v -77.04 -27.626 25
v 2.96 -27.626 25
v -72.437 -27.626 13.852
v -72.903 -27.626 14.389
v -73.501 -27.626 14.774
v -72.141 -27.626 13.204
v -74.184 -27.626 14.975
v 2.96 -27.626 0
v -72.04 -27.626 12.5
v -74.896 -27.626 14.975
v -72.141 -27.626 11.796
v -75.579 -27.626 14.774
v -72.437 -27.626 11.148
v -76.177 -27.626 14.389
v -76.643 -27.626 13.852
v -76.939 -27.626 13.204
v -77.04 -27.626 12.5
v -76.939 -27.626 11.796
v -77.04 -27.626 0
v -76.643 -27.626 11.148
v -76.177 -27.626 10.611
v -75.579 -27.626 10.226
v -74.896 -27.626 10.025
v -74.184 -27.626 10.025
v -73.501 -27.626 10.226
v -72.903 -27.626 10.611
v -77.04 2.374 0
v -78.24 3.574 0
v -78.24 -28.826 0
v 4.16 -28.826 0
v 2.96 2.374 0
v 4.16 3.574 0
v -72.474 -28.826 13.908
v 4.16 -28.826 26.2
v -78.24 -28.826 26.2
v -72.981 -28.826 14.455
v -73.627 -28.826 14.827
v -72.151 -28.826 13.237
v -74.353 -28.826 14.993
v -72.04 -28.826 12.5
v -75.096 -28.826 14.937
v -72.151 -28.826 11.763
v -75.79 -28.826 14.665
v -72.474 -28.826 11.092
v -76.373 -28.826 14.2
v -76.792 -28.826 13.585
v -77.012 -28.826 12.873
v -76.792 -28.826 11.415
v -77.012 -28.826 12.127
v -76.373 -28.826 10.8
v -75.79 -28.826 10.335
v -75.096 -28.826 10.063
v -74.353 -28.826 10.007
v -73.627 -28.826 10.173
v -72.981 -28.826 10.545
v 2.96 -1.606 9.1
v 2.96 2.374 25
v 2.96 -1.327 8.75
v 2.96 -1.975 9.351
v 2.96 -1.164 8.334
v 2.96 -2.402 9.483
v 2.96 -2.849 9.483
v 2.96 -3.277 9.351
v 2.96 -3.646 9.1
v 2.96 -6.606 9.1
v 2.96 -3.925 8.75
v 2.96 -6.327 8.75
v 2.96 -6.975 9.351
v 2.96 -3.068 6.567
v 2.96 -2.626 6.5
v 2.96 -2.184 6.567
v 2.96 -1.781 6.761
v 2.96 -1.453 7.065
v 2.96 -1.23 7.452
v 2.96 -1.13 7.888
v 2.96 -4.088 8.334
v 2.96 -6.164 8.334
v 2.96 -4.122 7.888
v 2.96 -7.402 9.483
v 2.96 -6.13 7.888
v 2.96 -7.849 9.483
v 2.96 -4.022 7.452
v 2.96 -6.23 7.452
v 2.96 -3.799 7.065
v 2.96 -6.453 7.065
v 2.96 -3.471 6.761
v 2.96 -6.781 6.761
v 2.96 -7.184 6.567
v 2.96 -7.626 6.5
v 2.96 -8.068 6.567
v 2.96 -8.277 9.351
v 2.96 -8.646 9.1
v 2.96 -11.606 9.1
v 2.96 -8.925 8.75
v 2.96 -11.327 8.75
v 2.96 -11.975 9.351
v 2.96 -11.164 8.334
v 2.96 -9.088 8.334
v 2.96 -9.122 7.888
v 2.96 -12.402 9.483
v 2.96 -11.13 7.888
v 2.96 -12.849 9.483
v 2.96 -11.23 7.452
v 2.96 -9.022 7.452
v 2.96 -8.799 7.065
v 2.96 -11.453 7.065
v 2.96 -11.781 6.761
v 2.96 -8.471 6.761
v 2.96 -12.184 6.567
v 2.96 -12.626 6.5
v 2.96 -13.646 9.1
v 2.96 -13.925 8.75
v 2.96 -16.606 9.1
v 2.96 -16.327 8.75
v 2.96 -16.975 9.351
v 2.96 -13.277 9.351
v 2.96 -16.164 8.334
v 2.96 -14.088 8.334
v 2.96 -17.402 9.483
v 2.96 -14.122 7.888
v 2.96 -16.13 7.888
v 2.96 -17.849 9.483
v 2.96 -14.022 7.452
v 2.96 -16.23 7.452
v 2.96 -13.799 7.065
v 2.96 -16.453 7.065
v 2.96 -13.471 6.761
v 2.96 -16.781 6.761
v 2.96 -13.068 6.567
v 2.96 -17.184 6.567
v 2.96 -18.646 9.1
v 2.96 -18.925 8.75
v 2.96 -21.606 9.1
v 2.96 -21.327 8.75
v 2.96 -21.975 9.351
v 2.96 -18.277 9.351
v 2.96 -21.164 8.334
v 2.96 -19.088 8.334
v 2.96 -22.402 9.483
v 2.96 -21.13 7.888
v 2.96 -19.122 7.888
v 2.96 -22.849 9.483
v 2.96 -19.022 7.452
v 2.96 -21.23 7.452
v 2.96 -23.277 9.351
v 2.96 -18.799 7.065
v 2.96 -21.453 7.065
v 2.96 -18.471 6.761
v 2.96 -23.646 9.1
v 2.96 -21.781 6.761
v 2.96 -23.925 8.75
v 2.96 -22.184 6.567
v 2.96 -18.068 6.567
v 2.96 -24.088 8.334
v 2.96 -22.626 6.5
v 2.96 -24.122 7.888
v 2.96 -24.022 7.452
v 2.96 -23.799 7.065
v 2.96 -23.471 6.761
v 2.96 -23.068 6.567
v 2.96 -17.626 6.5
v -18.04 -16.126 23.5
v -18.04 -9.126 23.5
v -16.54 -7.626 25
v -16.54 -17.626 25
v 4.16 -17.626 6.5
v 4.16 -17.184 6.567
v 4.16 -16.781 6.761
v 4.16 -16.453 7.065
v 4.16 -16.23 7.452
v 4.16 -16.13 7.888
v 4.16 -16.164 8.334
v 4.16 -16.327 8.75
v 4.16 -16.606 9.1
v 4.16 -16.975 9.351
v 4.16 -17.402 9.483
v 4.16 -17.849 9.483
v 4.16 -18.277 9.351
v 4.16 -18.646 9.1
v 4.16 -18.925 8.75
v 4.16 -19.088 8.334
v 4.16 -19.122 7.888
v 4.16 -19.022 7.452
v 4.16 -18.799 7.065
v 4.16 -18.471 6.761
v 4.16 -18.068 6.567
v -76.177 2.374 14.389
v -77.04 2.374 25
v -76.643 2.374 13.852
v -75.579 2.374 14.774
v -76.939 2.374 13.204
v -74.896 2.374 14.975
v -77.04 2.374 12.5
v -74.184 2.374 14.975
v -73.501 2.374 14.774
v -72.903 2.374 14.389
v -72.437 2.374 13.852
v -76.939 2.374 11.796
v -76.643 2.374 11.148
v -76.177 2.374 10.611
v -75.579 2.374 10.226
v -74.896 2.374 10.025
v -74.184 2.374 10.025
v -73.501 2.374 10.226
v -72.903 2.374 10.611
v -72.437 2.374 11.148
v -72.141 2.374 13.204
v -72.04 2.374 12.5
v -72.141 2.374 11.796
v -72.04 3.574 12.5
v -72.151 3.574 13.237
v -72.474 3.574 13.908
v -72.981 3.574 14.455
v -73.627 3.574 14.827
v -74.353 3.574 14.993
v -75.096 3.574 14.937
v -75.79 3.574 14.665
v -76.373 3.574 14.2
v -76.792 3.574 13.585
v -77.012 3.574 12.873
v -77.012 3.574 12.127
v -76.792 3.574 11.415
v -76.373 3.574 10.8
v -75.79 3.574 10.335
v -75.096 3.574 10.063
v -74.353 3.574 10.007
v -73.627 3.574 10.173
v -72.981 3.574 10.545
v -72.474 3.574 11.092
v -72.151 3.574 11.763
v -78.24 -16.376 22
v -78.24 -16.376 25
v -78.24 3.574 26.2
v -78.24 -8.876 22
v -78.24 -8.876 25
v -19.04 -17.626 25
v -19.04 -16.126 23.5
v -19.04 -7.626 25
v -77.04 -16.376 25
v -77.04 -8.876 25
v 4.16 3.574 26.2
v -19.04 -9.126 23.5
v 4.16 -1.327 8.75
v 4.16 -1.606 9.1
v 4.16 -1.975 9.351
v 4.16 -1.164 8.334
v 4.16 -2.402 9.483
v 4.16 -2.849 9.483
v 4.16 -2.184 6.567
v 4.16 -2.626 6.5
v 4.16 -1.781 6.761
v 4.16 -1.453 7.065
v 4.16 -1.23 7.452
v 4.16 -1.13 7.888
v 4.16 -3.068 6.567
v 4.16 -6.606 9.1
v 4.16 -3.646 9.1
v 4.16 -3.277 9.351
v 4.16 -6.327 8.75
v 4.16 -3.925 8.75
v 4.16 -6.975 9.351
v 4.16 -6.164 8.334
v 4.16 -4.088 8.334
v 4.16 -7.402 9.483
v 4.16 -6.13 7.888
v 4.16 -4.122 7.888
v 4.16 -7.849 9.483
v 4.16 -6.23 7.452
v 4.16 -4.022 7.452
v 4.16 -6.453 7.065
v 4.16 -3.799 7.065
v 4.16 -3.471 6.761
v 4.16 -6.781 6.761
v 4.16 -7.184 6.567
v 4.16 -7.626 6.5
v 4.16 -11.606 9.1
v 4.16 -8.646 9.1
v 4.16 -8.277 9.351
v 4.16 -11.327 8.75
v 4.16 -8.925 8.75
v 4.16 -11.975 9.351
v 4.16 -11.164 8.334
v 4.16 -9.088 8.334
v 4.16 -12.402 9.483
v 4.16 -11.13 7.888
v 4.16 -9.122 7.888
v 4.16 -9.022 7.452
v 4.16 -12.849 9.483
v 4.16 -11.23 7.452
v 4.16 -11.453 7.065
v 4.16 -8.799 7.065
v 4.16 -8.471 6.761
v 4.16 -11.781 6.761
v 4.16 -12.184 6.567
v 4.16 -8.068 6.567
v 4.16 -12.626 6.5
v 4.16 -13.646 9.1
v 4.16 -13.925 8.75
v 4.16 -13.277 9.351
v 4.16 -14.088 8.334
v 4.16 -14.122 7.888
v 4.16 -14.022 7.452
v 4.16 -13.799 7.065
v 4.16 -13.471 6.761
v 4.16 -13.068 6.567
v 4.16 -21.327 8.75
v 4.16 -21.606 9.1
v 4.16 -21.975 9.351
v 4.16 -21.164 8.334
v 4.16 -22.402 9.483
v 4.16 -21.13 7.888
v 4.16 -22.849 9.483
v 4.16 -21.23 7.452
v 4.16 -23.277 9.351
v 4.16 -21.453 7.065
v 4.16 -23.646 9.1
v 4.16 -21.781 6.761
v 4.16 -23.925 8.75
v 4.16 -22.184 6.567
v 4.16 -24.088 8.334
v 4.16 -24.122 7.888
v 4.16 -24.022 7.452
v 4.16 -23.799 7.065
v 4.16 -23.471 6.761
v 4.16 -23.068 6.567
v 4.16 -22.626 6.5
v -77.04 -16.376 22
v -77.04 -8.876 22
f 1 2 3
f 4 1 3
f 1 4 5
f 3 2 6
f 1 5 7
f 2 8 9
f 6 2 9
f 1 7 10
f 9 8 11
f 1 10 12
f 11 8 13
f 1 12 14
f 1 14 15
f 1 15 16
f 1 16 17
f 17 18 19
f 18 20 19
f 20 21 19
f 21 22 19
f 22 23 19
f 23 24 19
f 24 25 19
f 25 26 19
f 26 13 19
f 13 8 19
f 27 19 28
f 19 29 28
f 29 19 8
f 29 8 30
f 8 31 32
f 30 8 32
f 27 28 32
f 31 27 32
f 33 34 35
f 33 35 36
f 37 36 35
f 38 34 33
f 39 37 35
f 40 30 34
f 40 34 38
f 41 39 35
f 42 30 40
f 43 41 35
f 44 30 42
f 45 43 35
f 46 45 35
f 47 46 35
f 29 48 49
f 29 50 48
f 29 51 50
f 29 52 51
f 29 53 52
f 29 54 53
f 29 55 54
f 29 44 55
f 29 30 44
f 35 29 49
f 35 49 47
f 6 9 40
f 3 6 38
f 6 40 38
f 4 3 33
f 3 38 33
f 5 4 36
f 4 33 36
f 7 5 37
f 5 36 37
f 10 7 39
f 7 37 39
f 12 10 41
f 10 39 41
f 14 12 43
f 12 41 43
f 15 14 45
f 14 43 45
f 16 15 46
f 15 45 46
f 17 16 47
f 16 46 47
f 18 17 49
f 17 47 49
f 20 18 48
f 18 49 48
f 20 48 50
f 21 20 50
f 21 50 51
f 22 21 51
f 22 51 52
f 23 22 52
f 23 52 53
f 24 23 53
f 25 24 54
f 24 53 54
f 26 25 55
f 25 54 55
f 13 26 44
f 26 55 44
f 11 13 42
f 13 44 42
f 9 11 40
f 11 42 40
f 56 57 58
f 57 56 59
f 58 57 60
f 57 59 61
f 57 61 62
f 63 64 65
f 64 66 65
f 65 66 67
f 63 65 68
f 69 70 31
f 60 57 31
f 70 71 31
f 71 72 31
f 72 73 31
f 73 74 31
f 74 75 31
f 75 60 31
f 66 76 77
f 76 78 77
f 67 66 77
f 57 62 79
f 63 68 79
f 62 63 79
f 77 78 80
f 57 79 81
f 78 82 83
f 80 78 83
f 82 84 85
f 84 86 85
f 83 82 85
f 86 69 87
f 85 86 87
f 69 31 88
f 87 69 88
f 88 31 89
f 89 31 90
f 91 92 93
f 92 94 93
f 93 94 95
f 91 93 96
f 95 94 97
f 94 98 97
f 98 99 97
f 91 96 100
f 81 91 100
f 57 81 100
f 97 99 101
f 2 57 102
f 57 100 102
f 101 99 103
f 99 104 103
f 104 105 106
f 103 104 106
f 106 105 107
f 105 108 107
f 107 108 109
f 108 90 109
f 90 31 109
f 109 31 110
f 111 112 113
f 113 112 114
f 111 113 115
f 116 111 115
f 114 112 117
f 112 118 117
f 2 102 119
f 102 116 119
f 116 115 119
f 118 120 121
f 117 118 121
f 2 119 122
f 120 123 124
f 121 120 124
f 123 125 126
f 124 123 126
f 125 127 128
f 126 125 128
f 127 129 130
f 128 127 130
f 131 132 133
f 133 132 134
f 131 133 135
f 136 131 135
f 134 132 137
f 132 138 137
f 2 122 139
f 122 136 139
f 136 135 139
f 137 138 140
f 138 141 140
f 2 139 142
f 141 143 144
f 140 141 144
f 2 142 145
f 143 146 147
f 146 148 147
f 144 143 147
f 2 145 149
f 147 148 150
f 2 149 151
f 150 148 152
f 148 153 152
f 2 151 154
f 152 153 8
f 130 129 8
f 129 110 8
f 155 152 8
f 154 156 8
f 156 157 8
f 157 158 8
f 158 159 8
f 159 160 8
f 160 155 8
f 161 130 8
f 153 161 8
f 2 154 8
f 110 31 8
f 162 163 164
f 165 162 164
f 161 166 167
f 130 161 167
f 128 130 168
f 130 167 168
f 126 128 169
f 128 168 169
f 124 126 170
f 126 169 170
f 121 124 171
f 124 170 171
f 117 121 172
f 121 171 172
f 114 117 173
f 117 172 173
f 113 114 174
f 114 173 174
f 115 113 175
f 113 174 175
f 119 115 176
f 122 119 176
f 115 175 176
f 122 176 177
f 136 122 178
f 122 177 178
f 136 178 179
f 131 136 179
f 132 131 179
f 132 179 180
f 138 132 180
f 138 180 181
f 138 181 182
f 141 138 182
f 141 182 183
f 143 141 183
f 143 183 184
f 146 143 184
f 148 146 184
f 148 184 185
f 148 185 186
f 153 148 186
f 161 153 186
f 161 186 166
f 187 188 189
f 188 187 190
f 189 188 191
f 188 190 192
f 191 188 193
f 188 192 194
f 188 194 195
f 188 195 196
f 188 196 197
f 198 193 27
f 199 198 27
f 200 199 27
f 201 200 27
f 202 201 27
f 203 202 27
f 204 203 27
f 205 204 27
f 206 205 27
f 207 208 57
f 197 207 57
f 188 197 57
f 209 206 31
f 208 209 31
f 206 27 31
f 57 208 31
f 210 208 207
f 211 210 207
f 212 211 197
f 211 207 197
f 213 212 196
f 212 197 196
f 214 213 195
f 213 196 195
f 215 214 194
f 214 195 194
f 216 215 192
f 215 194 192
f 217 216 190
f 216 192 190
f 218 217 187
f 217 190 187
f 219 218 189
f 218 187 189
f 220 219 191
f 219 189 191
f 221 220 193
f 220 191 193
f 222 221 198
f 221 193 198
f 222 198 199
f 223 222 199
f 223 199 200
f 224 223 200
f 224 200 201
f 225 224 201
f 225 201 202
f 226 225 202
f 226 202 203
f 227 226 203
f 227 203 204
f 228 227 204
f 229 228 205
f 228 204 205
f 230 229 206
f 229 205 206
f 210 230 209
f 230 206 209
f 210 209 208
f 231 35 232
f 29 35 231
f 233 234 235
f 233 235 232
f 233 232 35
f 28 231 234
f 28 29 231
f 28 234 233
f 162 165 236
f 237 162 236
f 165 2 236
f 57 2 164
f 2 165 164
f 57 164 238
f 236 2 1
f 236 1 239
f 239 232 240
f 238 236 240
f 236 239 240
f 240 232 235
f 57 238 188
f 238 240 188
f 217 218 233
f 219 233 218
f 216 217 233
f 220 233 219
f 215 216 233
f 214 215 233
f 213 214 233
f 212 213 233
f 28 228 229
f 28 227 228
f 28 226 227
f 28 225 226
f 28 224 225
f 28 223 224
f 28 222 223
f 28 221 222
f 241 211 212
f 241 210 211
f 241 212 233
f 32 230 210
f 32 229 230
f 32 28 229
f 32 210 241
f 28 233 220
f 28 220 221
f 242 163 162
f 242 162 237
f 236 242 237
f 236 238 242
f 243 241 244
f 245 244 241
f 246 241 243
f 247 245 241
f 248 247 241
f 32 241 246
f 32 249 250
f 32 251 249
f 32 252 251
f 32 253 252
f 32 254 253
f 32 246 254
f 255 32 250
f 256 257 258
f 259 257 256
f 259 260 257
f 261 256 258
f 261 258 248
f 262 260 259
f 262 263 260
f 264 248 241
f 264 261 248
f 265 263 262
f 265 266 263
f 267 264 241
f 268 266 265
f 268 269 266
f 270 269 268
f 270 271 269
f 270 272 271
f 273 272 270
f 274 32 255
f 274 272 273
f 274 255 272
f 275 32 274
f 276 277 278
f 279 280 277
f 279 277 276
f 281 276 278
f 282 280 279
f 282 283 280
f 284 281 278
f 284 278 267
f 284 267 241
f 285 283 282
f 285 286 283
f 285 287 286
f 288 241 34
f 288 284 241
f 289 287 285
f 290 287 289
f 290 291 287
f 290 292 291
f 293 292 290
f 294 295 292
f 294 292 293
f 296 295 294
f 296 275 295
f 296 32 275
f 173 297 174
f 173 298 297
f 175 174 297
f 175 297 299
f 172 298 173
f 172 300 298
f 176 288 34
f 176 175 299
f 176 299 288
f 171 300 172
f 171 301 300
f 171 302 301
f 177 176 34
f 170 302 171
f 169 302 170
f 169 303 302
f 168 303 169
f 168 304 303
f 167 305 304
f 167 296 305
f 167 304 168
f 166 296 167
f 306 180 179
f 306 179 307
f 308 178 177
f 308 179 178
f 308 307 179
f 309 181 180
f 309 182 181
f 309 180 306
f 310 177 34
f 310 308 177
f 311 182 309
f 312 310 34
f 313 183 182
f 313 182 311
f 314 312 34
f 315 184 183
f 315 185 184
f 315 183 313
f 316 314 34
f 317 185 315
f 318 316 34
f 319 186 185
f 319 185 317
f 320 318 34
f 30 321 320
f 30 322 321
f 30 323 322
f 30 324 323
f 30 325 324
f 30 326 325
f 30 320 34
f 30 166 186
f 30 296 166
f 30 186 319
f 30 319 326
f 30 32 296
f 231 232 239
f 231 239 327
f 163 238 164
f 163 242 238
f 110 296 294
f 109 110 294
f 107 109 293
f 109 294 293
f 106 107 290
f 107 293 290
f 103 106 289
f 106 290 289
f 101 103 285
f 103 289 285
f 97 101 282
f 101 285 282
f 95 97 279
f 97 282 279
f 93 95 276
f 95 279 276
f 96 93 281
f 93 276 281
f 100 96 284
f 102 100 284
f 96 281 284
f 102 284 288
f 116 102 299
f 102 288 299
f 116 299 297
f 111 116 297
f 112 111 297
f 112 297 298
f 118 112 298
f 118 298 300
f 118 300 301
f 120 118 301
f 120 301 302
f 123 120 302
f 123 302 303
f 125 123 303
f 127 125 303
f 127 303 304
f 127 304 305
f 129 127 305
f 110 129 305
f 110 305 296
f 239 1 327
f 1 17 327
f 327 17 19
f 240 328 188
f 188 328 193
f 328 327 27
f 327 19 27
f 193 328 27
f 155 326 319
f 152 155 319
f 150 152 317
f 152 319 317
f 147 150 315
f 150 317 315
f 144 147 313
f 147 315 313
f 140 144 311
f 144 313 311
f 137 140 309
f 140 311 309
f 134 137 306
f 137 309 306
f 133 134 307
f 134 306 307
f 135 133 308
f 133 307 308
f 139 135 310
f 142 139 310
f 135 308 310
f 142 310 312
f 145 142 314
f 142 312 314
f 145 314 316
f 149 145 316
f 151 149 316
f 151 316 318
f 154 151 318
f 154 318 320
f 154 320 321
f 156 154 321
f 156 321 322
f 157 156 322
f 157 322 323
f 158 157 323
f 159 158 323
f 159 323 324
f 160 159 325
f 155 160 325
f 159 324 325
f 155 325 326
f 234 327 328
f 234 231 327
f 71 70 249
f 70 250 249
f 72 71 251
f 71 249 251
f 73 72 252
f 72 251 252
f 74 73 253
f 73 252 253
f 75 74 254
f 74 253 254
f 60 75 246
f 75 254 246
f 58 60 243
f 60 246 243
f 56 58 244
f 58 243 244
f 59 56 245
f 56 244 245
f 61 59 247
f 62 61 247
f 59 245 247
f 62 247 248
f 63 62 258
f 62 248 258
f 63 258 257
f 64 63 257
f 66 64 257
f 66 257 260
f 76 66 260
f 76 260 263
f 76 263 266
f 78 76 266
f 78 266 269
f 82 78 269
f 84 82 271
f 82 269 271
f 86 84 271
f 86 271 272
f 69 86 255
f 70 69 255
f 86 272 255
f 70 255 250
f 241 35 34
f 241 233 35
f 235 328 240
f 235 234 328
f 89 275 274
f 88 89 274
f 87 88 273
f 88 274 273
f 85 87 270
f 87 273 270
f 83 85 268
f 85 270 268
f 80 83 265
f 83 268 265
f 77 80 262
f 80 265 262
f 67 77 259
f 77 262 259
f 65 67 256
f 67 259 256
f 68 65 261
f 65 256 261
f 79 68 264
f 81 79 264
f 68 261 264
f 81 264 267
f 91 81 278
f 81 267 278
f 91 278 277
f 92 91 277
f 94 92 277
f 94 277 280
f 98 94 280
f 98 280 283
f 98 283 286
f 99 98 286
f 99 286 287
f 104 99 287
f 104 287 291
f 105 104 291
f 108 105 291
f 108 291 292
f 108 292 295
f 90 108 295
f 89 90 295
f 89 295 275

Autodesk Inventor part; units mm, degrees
ref_plane "YZ Plane" through (0, 0, 0) normal (1, 0, 0) x (0, 1, 0)
ref_plane "XZ Plane" through (0, 0, 0) normal (0, 1, 0) x (-1, 0, 0)
ref_plane "XY Plane" through (0, 0, 0) normal (0, 0, 1) x (1, 0, 0)
sketch "Sketch1" plane through (0, 0, 0) normal (0, 0, 1) x (1, 0, 0)
  line L0 (-78.24, 3.5741) -> (4.16, 3.5741)
  line L1 (4.16, 3.5741) -> (4.16, -28.8259)
  line L2 (4.16, -28.8259) -> (-78.24, -28.8259)
  line L3 (-78.24, -28.8259) -> (-78.24, 3.5741)
  line L4 (-77.04, 2.3741) -> (2.96, 2.3741)
  line L5 (2.96, 2.3741) -> (2.96, -27.6259)
  line L6 (2.96, -27.6259) -> (-77.04, -27.6259)
  line L7 (-77.04, -27.6259) -> (-77.04, 2.3741)
  point P0 (0, 0)
  dimension "d0" = 32.4
  dimension "d1" = 82.4
  dimension "d2" = 1.2
  dimension "d3" = 1.2
  dimension "d4" = 1.2
  dimension "d5" = 1.2
extrude "Extrusion1" add sketch "Sketch1" along normal blind 25
sketch "Sketch2" plane through (0, 0, 25) normal (0, 0, 1) x (1, 0, 0)
  line L0 (-78.24, 3.5741) -> (4.16, 3.5741)
  line L1 (4.16, 3.5741) -> (4.16, -28.8259)
  line L2 (4.16, -28.8259) -> (-78.24, -28.8259)
  line L3 (-78.24, -28.8259) -> (-78.24, 3.5741)
  point P0 (0, 0)
extrude "Extrusion2" add sketch "Sketch2" along normal blind 1.2
sketch "Sketch3" plane through (-78.24, -28.8259, 0) normal (-1, 0, 0) x (0, 0, 1)
  line L0 (25, 1.2) -> (25, 31.2) projected
  line L1 (25, 12.45) -> (22, 12.45)
  line L2 (22, 12.45) -> (22, 19.95)
  line L3 (22, 19.95) -> (25, 19.95)
  line L4 (25, 19.95) -> (25, 12.45)
  line L5 (0, 1.2) -> (25, 1.2) projected
  line L6 (0, 31.2) -> (25, 31.2) projected
  point P0 (0, 28.8259)
  dimension "d10" = 7.5
  dimension "d11" = 3
  dimension "d12" = 11.25
  dimension "d13" = 11.25
extrude "Extrusion3" cut sketch "Sketch3" against normal blind 1.2
sketch "Sketch4" plane through (0, 0, 25) normal (0, 0, -1) x (-1, 0, 0)
  point P0 (0, 0)
sketch "Sketch5" plane through (0, 0, 25) normal (0, 0, -1) x (-1, 0, 0)
  line L0 (18.04, -7.6259) -> (19.04, -7.6259)
  line L1 (19.04, -7.6259) -> (19.04, -17.6259)
  line L2 (19.04, -17.6259) -> (18.04, -17.6259)
  line L3 (18.04, -17.6259) -> (18.04, -7.6259)
  line L4 (-2.96, 2.3741) -> (77.04, 2.3741) projected
  line L5 (77.04, -27.6259) -> (-2.96, -27.6259) projected
  line L6 (77.04, 2.3741) -> (77.04, -27.6259) projected
  point P0 (0, 0)
  dimension "d16" = 1
  dimension "d17" = 10
  dimension "d18" = 10
  dimension "d19" = 10
  dimension "d20" = 58
extrude "Extrusion4" add sketch "Sketch5" along normal blind 1.5
chamfer "Chamfer1" distance 1.5 angle 45 2 edges at (-18.54, -17.6259, 23.5) (-18.54, -7.6259, 23.5)
chamfer "Chamfer2" distance 1.5 angle 45 1 edges at (-18.04, -12.6259, 25)
sketch "Sketch6" plane through (-78.24, -28.8259, 0) normal (0, -1, 0) x (1, 0, 0)
  circle A0 centre (3.7, 12.5) radius 2.5
  line L0 (1.2, 0) -> (1.2, 25) projected
  point P0 (78.24, 0)
  dimension "d29" = 5
  dimension "d30" = 2.5
extrude "Extrusion5" cut sketch "Sketch6" against normal blind 40
sketch "Sketch7" plane through (4.16, -28.8259, 0) normal (1, 0, 0) x (0, 0, -1)
  line L0 (0, 31.2) -> (-25, 31.2) projected
  line L1 (0, 32.4) -> (0, 0) projected
  circle A0 centre (-8, 26.2) radius 1.5
  circle A1 centre (-8, 21.2) radius 1.5
  circle A2 centre (-8, 16.2) radius 1.5
  circle A3 centre (-8, 11.2) radius 1.5
  circle A4 centre (-8, 6.2) radius 1.5
  line L2 (0, 1.2) -> (-25, 1.2) projected
  point P0 (0, 28.8259)
  point P1 (-8, 31.2)
  dimension "d33" = 8
  dimension "d34" = 3
  dimension "d35" = 3
  dimension "d36" = 3
  dimension "d37" = 3
  dimension "d38" = 3
  dimension "d39" = 5
  dimension "d40" = 5
  dimension "d41" = 5
  dimension "d42" = 5
  dimension "d43" = 5
  dimension "d44" = 5
extrude "Extrusion6" cut sketch "Sketch7" against normal blind 3
properties part number "Case Botom"
